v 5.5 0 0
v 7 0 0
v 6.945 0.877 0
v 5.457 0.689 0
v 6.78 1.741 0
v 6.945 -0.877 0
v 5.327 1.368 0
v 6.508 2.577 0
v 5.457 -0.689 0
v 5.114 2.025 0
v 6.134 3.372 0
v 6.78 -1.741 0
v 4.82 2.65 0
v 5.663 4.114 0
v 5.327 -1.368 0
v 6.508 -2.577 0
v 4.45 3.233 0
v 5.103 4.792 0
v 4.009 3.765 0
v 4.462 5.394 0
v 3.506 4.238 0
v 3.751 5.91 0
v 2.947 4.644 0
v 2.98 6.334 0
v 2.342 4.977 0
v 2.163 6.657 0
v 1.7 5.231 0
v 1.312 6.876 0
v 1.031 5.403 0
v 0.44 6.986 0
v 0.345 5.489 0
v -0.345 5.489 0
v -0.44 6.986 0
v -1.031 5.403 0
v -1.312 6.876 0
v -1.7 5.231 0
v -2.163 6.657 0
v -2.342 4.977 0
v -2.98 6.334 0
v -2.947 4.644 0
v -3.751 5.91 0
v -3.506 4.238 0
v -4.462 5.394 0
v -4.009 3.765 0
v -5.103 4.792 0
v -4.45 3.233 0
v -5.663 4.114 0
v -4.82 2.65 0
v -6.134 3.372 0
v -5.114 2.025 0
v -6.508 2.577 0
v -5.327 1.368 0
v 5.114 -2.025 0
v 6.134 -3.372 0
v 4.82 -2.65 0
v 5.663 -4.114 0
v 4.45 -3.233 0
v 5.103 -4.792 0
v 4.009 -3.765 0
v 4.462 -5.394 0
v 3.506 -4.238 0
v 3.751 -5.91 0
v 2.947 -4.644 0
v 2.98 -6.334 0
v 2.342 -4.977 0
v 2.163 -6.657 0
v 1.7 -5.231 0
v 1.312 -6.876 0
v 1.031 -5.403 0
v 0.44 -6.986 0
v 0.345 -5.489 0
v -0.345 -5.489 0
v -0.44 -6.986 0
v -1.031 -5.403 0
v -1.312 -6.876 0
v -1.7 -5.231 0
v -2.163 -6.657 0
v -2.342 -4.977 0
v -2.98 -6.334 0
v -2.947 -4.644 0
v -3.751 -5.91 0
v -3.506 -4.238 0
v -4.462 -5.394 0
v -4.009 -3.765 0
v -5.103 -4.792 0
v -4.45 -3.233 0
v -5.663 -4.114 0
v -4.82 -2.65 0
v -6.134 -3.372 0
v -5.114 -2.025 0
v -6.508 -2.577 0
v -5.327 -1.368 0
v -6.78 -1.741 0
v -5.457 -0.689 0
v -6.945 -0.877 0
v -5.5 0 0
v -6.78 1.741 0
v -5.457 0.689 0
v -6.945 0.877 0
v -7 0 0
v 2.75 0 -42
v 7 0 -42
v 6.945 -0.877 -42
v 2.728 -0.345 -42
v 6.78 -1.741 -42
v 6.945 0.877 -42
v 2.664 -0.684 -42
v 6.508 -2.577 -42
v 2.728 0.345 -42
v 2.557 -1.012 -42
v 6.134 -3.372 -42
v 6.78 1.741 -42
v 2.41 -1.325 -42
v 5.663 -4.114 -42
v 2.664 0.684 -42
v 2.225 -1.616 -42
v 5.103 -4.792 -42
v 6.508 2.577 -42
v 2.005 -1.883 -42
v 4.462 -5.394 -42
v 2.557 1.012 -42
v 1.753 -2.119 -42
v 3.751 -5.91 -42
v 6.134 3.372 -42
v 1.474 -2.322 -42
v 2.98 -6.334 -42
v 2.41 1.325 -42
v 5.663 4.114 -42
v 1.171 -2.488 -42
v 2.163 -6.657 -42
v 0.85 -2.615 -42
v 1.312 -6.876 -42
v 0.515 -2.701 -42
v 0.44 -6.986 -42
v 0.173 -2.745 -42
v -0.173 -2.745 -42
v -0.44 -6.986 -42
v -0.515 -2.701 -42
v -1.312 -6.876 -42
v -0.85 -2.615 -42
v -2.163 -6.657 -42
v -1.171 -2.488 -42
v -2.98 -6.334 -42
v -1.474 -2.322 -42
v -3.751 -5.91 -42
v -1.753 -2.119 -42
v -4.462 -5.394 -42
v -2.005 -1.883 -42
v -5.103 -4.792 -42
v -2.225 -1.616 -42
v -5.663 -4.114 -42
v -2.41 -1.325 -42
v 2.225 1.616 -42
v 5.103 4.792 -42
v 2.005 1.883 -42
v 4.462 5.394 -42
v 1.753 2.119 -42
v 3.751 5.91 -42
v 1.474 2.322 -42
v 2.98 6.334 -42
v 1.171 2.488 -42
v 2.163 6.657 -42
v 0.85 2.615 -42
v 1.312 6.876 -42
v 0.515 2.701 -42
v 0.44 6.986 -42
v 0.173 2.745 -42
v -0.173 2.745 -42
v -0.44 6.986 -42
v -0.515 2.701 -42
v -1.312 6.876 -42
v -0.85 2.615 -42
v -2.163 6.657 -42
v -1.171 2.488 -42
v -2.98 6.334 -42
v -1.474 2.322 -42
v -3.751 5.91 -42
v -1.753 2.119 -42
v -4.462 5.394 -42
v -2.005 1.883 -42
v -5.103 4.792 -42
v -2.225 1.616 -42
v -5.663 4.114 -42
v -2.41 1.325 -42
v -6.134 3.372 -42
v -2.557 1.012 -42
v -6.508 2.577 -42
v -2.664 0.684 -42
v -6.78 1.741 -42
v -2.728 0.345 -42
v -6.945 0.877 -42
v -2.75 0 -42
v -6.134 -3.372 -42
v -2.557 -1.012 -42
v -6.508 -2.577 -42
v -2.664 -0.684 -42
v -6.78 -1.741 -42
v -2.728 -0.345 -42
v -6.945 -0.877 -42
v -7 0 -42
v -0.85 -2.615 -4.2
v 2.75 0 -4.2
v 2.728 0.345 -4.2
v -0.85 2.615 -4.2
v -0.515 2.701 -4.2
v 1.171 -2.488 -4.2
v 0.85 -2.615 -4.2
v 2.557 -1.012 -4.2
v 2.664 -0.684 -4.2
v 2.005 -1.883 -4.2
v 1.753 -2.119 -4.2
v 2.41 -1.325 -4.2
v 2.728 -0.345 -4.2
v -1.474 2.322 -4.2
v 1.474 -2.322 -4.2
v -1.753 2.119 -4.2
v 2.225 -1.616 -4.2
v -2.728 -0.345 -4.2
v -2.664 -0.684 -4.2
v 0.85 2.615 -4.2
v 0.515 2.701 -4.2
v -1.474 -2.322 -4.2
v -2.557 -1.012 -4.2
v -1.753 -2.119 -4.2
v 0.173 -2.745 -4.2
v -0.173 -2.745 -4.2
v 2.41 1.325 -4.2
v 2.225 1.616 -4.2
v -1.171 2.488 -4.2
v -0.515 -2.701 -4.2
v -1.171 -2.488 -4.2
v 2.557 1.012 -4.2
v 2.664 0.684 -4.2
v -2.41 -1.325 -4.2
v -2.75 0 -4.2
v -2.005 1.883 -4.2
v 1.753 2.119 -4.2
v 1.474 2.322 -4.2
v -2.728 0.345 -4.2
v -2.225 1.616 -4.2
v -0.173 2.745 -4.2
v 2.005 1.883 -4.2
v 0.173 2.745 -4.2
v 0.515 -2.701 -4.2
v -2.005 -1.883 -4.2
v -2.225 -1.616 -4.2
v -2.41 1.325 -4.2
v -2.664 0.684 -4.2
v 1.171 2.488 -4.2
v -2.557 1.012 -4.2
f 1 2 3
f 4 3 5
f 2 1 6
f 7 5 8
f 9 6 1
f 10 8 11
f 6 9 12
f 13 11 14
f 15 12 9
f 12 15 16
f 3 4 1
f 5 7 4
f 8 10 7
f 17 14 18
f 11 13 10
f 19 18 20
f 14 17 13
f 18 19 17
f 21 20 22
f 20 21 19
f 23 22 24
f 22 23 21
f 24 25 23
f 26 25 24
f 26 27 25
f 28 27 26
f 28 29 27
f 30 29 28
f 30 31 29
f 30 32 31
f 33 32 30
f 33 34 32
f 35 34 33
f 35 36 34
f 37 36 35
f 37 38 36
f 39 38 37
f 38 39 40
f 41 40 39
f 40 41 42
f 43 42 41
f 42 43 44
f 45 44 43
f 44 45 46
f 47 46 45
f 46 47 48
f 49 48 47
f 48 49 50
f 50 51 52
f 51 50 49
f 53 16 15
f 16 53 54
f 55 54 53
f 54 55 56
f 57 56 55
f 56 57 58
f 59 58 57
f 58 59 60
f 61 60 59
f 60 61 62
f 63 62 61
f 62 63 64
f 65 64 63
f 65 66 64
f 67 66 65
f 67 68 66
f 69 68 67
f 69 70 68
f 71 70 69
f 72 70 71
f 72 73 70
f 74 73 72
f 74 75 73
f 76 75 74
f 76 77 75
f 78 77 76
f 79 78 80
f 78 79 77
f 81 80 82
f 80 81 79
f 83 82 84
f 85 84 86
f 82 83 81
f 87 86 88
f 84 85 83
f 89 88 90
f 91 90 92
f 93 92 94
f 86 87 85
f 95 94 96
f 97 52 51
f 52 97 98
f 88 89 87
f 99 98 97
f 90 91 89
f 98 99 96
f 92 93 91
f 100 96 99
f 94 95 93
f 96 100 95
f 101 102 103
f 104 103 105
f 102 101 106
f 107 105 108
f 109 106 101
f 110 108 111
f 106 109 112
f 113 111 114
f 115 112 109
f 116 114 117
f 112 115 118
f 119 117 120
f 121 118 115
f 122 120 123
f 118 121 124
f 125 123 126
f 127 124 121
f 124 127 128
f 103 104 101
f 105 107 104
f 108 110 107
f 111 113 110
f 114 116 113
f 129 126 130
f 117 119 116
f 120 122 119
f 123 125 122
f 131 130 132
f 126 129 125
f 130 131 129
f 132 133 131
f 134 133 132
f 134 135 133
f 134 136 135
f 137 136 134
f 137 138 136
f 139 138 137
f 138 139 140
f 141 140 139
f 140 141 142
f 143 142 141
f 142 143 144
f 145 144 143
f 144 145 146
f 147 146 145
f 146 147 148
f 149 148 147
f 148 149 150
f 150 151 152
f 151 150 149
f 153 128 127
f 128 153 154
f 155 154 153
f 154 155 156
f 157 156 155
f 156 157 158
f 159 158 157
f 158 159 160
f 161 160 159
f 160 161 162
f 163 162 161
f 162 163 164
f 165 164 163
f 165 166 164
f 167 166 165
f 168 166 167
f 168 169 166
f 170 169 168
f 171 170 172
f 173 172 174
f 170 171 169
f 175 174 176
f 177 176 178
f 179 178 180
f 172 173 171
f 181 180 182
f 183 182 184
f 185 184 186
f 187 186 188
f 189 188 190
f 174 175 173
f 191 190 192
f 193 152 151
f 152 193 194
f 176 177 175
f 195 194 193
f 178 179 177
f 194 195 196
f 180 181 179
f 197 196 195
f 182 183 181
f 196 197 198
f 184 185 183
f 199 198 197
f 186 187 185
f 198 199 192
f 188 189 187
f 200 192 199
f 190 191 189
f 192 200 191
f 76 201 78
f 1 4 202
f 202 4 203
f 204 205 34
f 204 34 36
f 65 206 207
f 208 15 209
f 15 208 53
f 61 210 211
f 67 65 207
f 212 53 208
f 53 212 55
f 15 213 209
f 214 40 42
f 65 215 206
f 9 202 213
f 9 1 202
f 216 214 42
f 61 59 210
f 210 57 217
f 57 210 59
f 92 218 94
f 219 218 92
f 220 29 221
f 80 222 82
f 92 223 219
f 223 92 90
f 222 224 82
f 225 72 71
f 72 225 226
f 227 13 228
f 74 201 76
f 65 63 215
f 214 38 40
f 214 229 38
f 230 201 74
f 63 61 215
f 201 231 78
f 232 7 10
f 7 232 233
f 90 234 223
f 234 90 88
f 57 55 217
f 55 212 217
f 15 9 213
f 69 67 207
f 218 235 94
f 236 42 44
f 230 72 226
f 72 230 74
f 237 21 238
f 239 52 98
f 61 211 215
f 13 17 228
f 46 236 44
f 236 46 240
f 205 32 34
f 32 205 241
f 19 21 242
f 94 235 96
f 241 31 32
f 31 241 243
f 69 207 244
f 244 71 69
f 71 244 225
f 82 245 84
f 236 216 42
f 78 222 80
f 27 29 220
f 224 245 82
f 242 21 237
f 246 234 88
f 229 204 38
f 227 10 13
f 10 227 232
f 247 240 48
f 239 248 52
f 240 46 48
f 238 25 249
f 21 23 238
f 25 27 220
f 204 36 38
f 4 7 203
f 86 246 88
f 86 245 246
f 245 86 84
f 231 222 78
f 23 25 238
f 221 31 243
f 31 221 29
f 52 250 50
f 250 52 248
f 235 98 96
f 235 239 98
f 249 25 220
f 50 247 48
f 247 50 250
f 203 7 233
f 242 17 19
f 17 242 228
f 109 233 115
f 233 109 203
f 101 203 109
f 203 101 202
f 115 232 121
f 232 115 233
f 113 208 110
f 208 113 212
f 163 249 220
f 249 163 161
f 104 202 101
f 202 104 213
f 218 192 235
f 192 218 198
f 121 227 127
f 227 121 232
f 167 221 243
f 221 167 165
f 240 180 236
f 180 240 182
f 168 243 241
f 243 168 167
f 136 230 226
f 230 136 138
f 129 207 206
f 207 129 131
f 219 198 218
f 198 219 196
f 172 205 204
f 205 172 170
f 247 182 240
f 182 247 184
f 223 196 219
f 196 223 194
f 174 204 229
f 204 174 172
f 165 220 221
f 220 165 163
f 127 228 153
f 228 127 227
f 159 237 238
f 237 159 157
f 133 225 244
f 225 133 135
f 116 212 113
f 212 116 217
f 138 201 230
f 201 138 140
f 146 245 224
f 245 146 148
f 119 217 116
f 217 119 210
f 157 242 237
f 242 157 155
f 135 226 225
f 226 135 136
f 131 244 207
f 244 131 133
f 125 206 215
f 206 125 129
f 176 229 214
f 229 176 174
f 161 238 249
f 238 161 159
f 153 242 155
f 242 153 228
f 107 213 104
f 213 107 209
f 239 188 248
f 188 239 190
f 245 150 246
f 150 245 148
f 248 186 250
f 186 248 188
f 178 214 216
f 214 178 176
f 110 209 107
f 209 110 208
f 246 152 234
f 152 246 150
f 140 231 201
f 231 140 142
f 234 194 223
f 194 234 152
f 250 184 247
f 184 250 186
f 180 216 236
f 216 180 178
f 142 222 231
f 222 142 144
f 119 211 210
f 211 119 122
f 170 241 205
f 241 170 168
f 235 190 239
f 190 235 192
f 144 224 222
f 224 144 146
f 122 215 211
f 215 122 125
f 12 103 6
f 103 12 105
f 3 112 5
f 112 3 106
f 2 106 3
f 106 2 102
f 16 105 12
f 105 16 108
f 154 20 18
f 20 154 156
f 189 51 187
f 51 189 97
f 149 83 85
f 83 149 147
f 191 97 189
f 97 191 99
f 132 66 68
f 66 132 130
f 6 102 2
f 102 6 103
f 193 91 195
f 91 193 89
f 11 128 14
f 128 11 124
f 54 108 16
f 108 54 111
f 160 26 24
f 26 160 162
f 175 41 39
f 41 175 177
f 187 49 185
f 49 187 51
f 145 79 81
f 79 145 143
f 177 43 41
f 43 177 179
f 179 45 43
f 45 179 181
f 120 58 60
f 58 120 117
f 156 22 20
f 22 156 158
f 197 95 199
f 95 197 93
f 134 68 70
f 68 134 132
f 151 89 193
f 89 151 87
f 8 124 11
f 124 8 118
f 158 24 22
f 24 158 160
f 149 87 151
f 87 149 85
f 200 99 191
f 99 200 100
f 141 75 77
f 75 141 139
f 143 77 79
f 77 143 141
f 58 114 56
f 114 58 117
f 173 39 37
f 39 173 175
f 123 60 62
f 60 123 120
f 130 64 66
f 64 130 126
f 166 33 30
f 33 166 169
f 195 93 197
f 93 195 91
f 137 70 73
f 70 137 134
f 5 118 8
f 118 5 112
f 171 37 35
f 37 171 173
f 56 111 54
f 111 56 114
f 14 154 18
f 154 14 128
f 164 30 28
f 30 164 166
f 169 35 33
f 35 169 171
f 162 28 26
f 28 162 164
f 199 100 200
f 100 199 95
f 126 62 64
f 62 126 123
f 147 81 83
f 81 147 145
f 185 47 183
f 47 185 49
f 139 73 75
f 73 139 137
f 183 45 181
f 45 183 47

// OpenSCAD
$fn = 50;


difference() {
	union() {
		translate(v = [0, 0, -42.0000000000]) {
			cylinder(h = 42, r = 7.0000000000);
		}
		cylinder(h = 0, r = 13.0000000000);
	}
	union() {
		translate(v = [0, 0, 0]) {
			rotate(a = [0, 0, 0]) {
				difference() {
					union() {
						#translate(v = [0, 0, -42.0000000000]) {
							cylinder(h = 42, r = 2.2500000000);
						}
						#translate(v = [0, 0, -4.2000000000]) {
							cylinder(h = 4.2000000000, r = 7.0000000000, r1 = 2.7500000000, r2 = 5.5000000000);
						}
						#translate(v = [0, 0, -42.0000000000]) {
							cylinder(h = 42, r = 2.7500000000);
						}
						#translate(v = [0, 0, -42.0000000000]) {
							cylinder(h = 42, r = 2.2500000000);
						}
					}
					union();
				}
			}
		}
	}
}
